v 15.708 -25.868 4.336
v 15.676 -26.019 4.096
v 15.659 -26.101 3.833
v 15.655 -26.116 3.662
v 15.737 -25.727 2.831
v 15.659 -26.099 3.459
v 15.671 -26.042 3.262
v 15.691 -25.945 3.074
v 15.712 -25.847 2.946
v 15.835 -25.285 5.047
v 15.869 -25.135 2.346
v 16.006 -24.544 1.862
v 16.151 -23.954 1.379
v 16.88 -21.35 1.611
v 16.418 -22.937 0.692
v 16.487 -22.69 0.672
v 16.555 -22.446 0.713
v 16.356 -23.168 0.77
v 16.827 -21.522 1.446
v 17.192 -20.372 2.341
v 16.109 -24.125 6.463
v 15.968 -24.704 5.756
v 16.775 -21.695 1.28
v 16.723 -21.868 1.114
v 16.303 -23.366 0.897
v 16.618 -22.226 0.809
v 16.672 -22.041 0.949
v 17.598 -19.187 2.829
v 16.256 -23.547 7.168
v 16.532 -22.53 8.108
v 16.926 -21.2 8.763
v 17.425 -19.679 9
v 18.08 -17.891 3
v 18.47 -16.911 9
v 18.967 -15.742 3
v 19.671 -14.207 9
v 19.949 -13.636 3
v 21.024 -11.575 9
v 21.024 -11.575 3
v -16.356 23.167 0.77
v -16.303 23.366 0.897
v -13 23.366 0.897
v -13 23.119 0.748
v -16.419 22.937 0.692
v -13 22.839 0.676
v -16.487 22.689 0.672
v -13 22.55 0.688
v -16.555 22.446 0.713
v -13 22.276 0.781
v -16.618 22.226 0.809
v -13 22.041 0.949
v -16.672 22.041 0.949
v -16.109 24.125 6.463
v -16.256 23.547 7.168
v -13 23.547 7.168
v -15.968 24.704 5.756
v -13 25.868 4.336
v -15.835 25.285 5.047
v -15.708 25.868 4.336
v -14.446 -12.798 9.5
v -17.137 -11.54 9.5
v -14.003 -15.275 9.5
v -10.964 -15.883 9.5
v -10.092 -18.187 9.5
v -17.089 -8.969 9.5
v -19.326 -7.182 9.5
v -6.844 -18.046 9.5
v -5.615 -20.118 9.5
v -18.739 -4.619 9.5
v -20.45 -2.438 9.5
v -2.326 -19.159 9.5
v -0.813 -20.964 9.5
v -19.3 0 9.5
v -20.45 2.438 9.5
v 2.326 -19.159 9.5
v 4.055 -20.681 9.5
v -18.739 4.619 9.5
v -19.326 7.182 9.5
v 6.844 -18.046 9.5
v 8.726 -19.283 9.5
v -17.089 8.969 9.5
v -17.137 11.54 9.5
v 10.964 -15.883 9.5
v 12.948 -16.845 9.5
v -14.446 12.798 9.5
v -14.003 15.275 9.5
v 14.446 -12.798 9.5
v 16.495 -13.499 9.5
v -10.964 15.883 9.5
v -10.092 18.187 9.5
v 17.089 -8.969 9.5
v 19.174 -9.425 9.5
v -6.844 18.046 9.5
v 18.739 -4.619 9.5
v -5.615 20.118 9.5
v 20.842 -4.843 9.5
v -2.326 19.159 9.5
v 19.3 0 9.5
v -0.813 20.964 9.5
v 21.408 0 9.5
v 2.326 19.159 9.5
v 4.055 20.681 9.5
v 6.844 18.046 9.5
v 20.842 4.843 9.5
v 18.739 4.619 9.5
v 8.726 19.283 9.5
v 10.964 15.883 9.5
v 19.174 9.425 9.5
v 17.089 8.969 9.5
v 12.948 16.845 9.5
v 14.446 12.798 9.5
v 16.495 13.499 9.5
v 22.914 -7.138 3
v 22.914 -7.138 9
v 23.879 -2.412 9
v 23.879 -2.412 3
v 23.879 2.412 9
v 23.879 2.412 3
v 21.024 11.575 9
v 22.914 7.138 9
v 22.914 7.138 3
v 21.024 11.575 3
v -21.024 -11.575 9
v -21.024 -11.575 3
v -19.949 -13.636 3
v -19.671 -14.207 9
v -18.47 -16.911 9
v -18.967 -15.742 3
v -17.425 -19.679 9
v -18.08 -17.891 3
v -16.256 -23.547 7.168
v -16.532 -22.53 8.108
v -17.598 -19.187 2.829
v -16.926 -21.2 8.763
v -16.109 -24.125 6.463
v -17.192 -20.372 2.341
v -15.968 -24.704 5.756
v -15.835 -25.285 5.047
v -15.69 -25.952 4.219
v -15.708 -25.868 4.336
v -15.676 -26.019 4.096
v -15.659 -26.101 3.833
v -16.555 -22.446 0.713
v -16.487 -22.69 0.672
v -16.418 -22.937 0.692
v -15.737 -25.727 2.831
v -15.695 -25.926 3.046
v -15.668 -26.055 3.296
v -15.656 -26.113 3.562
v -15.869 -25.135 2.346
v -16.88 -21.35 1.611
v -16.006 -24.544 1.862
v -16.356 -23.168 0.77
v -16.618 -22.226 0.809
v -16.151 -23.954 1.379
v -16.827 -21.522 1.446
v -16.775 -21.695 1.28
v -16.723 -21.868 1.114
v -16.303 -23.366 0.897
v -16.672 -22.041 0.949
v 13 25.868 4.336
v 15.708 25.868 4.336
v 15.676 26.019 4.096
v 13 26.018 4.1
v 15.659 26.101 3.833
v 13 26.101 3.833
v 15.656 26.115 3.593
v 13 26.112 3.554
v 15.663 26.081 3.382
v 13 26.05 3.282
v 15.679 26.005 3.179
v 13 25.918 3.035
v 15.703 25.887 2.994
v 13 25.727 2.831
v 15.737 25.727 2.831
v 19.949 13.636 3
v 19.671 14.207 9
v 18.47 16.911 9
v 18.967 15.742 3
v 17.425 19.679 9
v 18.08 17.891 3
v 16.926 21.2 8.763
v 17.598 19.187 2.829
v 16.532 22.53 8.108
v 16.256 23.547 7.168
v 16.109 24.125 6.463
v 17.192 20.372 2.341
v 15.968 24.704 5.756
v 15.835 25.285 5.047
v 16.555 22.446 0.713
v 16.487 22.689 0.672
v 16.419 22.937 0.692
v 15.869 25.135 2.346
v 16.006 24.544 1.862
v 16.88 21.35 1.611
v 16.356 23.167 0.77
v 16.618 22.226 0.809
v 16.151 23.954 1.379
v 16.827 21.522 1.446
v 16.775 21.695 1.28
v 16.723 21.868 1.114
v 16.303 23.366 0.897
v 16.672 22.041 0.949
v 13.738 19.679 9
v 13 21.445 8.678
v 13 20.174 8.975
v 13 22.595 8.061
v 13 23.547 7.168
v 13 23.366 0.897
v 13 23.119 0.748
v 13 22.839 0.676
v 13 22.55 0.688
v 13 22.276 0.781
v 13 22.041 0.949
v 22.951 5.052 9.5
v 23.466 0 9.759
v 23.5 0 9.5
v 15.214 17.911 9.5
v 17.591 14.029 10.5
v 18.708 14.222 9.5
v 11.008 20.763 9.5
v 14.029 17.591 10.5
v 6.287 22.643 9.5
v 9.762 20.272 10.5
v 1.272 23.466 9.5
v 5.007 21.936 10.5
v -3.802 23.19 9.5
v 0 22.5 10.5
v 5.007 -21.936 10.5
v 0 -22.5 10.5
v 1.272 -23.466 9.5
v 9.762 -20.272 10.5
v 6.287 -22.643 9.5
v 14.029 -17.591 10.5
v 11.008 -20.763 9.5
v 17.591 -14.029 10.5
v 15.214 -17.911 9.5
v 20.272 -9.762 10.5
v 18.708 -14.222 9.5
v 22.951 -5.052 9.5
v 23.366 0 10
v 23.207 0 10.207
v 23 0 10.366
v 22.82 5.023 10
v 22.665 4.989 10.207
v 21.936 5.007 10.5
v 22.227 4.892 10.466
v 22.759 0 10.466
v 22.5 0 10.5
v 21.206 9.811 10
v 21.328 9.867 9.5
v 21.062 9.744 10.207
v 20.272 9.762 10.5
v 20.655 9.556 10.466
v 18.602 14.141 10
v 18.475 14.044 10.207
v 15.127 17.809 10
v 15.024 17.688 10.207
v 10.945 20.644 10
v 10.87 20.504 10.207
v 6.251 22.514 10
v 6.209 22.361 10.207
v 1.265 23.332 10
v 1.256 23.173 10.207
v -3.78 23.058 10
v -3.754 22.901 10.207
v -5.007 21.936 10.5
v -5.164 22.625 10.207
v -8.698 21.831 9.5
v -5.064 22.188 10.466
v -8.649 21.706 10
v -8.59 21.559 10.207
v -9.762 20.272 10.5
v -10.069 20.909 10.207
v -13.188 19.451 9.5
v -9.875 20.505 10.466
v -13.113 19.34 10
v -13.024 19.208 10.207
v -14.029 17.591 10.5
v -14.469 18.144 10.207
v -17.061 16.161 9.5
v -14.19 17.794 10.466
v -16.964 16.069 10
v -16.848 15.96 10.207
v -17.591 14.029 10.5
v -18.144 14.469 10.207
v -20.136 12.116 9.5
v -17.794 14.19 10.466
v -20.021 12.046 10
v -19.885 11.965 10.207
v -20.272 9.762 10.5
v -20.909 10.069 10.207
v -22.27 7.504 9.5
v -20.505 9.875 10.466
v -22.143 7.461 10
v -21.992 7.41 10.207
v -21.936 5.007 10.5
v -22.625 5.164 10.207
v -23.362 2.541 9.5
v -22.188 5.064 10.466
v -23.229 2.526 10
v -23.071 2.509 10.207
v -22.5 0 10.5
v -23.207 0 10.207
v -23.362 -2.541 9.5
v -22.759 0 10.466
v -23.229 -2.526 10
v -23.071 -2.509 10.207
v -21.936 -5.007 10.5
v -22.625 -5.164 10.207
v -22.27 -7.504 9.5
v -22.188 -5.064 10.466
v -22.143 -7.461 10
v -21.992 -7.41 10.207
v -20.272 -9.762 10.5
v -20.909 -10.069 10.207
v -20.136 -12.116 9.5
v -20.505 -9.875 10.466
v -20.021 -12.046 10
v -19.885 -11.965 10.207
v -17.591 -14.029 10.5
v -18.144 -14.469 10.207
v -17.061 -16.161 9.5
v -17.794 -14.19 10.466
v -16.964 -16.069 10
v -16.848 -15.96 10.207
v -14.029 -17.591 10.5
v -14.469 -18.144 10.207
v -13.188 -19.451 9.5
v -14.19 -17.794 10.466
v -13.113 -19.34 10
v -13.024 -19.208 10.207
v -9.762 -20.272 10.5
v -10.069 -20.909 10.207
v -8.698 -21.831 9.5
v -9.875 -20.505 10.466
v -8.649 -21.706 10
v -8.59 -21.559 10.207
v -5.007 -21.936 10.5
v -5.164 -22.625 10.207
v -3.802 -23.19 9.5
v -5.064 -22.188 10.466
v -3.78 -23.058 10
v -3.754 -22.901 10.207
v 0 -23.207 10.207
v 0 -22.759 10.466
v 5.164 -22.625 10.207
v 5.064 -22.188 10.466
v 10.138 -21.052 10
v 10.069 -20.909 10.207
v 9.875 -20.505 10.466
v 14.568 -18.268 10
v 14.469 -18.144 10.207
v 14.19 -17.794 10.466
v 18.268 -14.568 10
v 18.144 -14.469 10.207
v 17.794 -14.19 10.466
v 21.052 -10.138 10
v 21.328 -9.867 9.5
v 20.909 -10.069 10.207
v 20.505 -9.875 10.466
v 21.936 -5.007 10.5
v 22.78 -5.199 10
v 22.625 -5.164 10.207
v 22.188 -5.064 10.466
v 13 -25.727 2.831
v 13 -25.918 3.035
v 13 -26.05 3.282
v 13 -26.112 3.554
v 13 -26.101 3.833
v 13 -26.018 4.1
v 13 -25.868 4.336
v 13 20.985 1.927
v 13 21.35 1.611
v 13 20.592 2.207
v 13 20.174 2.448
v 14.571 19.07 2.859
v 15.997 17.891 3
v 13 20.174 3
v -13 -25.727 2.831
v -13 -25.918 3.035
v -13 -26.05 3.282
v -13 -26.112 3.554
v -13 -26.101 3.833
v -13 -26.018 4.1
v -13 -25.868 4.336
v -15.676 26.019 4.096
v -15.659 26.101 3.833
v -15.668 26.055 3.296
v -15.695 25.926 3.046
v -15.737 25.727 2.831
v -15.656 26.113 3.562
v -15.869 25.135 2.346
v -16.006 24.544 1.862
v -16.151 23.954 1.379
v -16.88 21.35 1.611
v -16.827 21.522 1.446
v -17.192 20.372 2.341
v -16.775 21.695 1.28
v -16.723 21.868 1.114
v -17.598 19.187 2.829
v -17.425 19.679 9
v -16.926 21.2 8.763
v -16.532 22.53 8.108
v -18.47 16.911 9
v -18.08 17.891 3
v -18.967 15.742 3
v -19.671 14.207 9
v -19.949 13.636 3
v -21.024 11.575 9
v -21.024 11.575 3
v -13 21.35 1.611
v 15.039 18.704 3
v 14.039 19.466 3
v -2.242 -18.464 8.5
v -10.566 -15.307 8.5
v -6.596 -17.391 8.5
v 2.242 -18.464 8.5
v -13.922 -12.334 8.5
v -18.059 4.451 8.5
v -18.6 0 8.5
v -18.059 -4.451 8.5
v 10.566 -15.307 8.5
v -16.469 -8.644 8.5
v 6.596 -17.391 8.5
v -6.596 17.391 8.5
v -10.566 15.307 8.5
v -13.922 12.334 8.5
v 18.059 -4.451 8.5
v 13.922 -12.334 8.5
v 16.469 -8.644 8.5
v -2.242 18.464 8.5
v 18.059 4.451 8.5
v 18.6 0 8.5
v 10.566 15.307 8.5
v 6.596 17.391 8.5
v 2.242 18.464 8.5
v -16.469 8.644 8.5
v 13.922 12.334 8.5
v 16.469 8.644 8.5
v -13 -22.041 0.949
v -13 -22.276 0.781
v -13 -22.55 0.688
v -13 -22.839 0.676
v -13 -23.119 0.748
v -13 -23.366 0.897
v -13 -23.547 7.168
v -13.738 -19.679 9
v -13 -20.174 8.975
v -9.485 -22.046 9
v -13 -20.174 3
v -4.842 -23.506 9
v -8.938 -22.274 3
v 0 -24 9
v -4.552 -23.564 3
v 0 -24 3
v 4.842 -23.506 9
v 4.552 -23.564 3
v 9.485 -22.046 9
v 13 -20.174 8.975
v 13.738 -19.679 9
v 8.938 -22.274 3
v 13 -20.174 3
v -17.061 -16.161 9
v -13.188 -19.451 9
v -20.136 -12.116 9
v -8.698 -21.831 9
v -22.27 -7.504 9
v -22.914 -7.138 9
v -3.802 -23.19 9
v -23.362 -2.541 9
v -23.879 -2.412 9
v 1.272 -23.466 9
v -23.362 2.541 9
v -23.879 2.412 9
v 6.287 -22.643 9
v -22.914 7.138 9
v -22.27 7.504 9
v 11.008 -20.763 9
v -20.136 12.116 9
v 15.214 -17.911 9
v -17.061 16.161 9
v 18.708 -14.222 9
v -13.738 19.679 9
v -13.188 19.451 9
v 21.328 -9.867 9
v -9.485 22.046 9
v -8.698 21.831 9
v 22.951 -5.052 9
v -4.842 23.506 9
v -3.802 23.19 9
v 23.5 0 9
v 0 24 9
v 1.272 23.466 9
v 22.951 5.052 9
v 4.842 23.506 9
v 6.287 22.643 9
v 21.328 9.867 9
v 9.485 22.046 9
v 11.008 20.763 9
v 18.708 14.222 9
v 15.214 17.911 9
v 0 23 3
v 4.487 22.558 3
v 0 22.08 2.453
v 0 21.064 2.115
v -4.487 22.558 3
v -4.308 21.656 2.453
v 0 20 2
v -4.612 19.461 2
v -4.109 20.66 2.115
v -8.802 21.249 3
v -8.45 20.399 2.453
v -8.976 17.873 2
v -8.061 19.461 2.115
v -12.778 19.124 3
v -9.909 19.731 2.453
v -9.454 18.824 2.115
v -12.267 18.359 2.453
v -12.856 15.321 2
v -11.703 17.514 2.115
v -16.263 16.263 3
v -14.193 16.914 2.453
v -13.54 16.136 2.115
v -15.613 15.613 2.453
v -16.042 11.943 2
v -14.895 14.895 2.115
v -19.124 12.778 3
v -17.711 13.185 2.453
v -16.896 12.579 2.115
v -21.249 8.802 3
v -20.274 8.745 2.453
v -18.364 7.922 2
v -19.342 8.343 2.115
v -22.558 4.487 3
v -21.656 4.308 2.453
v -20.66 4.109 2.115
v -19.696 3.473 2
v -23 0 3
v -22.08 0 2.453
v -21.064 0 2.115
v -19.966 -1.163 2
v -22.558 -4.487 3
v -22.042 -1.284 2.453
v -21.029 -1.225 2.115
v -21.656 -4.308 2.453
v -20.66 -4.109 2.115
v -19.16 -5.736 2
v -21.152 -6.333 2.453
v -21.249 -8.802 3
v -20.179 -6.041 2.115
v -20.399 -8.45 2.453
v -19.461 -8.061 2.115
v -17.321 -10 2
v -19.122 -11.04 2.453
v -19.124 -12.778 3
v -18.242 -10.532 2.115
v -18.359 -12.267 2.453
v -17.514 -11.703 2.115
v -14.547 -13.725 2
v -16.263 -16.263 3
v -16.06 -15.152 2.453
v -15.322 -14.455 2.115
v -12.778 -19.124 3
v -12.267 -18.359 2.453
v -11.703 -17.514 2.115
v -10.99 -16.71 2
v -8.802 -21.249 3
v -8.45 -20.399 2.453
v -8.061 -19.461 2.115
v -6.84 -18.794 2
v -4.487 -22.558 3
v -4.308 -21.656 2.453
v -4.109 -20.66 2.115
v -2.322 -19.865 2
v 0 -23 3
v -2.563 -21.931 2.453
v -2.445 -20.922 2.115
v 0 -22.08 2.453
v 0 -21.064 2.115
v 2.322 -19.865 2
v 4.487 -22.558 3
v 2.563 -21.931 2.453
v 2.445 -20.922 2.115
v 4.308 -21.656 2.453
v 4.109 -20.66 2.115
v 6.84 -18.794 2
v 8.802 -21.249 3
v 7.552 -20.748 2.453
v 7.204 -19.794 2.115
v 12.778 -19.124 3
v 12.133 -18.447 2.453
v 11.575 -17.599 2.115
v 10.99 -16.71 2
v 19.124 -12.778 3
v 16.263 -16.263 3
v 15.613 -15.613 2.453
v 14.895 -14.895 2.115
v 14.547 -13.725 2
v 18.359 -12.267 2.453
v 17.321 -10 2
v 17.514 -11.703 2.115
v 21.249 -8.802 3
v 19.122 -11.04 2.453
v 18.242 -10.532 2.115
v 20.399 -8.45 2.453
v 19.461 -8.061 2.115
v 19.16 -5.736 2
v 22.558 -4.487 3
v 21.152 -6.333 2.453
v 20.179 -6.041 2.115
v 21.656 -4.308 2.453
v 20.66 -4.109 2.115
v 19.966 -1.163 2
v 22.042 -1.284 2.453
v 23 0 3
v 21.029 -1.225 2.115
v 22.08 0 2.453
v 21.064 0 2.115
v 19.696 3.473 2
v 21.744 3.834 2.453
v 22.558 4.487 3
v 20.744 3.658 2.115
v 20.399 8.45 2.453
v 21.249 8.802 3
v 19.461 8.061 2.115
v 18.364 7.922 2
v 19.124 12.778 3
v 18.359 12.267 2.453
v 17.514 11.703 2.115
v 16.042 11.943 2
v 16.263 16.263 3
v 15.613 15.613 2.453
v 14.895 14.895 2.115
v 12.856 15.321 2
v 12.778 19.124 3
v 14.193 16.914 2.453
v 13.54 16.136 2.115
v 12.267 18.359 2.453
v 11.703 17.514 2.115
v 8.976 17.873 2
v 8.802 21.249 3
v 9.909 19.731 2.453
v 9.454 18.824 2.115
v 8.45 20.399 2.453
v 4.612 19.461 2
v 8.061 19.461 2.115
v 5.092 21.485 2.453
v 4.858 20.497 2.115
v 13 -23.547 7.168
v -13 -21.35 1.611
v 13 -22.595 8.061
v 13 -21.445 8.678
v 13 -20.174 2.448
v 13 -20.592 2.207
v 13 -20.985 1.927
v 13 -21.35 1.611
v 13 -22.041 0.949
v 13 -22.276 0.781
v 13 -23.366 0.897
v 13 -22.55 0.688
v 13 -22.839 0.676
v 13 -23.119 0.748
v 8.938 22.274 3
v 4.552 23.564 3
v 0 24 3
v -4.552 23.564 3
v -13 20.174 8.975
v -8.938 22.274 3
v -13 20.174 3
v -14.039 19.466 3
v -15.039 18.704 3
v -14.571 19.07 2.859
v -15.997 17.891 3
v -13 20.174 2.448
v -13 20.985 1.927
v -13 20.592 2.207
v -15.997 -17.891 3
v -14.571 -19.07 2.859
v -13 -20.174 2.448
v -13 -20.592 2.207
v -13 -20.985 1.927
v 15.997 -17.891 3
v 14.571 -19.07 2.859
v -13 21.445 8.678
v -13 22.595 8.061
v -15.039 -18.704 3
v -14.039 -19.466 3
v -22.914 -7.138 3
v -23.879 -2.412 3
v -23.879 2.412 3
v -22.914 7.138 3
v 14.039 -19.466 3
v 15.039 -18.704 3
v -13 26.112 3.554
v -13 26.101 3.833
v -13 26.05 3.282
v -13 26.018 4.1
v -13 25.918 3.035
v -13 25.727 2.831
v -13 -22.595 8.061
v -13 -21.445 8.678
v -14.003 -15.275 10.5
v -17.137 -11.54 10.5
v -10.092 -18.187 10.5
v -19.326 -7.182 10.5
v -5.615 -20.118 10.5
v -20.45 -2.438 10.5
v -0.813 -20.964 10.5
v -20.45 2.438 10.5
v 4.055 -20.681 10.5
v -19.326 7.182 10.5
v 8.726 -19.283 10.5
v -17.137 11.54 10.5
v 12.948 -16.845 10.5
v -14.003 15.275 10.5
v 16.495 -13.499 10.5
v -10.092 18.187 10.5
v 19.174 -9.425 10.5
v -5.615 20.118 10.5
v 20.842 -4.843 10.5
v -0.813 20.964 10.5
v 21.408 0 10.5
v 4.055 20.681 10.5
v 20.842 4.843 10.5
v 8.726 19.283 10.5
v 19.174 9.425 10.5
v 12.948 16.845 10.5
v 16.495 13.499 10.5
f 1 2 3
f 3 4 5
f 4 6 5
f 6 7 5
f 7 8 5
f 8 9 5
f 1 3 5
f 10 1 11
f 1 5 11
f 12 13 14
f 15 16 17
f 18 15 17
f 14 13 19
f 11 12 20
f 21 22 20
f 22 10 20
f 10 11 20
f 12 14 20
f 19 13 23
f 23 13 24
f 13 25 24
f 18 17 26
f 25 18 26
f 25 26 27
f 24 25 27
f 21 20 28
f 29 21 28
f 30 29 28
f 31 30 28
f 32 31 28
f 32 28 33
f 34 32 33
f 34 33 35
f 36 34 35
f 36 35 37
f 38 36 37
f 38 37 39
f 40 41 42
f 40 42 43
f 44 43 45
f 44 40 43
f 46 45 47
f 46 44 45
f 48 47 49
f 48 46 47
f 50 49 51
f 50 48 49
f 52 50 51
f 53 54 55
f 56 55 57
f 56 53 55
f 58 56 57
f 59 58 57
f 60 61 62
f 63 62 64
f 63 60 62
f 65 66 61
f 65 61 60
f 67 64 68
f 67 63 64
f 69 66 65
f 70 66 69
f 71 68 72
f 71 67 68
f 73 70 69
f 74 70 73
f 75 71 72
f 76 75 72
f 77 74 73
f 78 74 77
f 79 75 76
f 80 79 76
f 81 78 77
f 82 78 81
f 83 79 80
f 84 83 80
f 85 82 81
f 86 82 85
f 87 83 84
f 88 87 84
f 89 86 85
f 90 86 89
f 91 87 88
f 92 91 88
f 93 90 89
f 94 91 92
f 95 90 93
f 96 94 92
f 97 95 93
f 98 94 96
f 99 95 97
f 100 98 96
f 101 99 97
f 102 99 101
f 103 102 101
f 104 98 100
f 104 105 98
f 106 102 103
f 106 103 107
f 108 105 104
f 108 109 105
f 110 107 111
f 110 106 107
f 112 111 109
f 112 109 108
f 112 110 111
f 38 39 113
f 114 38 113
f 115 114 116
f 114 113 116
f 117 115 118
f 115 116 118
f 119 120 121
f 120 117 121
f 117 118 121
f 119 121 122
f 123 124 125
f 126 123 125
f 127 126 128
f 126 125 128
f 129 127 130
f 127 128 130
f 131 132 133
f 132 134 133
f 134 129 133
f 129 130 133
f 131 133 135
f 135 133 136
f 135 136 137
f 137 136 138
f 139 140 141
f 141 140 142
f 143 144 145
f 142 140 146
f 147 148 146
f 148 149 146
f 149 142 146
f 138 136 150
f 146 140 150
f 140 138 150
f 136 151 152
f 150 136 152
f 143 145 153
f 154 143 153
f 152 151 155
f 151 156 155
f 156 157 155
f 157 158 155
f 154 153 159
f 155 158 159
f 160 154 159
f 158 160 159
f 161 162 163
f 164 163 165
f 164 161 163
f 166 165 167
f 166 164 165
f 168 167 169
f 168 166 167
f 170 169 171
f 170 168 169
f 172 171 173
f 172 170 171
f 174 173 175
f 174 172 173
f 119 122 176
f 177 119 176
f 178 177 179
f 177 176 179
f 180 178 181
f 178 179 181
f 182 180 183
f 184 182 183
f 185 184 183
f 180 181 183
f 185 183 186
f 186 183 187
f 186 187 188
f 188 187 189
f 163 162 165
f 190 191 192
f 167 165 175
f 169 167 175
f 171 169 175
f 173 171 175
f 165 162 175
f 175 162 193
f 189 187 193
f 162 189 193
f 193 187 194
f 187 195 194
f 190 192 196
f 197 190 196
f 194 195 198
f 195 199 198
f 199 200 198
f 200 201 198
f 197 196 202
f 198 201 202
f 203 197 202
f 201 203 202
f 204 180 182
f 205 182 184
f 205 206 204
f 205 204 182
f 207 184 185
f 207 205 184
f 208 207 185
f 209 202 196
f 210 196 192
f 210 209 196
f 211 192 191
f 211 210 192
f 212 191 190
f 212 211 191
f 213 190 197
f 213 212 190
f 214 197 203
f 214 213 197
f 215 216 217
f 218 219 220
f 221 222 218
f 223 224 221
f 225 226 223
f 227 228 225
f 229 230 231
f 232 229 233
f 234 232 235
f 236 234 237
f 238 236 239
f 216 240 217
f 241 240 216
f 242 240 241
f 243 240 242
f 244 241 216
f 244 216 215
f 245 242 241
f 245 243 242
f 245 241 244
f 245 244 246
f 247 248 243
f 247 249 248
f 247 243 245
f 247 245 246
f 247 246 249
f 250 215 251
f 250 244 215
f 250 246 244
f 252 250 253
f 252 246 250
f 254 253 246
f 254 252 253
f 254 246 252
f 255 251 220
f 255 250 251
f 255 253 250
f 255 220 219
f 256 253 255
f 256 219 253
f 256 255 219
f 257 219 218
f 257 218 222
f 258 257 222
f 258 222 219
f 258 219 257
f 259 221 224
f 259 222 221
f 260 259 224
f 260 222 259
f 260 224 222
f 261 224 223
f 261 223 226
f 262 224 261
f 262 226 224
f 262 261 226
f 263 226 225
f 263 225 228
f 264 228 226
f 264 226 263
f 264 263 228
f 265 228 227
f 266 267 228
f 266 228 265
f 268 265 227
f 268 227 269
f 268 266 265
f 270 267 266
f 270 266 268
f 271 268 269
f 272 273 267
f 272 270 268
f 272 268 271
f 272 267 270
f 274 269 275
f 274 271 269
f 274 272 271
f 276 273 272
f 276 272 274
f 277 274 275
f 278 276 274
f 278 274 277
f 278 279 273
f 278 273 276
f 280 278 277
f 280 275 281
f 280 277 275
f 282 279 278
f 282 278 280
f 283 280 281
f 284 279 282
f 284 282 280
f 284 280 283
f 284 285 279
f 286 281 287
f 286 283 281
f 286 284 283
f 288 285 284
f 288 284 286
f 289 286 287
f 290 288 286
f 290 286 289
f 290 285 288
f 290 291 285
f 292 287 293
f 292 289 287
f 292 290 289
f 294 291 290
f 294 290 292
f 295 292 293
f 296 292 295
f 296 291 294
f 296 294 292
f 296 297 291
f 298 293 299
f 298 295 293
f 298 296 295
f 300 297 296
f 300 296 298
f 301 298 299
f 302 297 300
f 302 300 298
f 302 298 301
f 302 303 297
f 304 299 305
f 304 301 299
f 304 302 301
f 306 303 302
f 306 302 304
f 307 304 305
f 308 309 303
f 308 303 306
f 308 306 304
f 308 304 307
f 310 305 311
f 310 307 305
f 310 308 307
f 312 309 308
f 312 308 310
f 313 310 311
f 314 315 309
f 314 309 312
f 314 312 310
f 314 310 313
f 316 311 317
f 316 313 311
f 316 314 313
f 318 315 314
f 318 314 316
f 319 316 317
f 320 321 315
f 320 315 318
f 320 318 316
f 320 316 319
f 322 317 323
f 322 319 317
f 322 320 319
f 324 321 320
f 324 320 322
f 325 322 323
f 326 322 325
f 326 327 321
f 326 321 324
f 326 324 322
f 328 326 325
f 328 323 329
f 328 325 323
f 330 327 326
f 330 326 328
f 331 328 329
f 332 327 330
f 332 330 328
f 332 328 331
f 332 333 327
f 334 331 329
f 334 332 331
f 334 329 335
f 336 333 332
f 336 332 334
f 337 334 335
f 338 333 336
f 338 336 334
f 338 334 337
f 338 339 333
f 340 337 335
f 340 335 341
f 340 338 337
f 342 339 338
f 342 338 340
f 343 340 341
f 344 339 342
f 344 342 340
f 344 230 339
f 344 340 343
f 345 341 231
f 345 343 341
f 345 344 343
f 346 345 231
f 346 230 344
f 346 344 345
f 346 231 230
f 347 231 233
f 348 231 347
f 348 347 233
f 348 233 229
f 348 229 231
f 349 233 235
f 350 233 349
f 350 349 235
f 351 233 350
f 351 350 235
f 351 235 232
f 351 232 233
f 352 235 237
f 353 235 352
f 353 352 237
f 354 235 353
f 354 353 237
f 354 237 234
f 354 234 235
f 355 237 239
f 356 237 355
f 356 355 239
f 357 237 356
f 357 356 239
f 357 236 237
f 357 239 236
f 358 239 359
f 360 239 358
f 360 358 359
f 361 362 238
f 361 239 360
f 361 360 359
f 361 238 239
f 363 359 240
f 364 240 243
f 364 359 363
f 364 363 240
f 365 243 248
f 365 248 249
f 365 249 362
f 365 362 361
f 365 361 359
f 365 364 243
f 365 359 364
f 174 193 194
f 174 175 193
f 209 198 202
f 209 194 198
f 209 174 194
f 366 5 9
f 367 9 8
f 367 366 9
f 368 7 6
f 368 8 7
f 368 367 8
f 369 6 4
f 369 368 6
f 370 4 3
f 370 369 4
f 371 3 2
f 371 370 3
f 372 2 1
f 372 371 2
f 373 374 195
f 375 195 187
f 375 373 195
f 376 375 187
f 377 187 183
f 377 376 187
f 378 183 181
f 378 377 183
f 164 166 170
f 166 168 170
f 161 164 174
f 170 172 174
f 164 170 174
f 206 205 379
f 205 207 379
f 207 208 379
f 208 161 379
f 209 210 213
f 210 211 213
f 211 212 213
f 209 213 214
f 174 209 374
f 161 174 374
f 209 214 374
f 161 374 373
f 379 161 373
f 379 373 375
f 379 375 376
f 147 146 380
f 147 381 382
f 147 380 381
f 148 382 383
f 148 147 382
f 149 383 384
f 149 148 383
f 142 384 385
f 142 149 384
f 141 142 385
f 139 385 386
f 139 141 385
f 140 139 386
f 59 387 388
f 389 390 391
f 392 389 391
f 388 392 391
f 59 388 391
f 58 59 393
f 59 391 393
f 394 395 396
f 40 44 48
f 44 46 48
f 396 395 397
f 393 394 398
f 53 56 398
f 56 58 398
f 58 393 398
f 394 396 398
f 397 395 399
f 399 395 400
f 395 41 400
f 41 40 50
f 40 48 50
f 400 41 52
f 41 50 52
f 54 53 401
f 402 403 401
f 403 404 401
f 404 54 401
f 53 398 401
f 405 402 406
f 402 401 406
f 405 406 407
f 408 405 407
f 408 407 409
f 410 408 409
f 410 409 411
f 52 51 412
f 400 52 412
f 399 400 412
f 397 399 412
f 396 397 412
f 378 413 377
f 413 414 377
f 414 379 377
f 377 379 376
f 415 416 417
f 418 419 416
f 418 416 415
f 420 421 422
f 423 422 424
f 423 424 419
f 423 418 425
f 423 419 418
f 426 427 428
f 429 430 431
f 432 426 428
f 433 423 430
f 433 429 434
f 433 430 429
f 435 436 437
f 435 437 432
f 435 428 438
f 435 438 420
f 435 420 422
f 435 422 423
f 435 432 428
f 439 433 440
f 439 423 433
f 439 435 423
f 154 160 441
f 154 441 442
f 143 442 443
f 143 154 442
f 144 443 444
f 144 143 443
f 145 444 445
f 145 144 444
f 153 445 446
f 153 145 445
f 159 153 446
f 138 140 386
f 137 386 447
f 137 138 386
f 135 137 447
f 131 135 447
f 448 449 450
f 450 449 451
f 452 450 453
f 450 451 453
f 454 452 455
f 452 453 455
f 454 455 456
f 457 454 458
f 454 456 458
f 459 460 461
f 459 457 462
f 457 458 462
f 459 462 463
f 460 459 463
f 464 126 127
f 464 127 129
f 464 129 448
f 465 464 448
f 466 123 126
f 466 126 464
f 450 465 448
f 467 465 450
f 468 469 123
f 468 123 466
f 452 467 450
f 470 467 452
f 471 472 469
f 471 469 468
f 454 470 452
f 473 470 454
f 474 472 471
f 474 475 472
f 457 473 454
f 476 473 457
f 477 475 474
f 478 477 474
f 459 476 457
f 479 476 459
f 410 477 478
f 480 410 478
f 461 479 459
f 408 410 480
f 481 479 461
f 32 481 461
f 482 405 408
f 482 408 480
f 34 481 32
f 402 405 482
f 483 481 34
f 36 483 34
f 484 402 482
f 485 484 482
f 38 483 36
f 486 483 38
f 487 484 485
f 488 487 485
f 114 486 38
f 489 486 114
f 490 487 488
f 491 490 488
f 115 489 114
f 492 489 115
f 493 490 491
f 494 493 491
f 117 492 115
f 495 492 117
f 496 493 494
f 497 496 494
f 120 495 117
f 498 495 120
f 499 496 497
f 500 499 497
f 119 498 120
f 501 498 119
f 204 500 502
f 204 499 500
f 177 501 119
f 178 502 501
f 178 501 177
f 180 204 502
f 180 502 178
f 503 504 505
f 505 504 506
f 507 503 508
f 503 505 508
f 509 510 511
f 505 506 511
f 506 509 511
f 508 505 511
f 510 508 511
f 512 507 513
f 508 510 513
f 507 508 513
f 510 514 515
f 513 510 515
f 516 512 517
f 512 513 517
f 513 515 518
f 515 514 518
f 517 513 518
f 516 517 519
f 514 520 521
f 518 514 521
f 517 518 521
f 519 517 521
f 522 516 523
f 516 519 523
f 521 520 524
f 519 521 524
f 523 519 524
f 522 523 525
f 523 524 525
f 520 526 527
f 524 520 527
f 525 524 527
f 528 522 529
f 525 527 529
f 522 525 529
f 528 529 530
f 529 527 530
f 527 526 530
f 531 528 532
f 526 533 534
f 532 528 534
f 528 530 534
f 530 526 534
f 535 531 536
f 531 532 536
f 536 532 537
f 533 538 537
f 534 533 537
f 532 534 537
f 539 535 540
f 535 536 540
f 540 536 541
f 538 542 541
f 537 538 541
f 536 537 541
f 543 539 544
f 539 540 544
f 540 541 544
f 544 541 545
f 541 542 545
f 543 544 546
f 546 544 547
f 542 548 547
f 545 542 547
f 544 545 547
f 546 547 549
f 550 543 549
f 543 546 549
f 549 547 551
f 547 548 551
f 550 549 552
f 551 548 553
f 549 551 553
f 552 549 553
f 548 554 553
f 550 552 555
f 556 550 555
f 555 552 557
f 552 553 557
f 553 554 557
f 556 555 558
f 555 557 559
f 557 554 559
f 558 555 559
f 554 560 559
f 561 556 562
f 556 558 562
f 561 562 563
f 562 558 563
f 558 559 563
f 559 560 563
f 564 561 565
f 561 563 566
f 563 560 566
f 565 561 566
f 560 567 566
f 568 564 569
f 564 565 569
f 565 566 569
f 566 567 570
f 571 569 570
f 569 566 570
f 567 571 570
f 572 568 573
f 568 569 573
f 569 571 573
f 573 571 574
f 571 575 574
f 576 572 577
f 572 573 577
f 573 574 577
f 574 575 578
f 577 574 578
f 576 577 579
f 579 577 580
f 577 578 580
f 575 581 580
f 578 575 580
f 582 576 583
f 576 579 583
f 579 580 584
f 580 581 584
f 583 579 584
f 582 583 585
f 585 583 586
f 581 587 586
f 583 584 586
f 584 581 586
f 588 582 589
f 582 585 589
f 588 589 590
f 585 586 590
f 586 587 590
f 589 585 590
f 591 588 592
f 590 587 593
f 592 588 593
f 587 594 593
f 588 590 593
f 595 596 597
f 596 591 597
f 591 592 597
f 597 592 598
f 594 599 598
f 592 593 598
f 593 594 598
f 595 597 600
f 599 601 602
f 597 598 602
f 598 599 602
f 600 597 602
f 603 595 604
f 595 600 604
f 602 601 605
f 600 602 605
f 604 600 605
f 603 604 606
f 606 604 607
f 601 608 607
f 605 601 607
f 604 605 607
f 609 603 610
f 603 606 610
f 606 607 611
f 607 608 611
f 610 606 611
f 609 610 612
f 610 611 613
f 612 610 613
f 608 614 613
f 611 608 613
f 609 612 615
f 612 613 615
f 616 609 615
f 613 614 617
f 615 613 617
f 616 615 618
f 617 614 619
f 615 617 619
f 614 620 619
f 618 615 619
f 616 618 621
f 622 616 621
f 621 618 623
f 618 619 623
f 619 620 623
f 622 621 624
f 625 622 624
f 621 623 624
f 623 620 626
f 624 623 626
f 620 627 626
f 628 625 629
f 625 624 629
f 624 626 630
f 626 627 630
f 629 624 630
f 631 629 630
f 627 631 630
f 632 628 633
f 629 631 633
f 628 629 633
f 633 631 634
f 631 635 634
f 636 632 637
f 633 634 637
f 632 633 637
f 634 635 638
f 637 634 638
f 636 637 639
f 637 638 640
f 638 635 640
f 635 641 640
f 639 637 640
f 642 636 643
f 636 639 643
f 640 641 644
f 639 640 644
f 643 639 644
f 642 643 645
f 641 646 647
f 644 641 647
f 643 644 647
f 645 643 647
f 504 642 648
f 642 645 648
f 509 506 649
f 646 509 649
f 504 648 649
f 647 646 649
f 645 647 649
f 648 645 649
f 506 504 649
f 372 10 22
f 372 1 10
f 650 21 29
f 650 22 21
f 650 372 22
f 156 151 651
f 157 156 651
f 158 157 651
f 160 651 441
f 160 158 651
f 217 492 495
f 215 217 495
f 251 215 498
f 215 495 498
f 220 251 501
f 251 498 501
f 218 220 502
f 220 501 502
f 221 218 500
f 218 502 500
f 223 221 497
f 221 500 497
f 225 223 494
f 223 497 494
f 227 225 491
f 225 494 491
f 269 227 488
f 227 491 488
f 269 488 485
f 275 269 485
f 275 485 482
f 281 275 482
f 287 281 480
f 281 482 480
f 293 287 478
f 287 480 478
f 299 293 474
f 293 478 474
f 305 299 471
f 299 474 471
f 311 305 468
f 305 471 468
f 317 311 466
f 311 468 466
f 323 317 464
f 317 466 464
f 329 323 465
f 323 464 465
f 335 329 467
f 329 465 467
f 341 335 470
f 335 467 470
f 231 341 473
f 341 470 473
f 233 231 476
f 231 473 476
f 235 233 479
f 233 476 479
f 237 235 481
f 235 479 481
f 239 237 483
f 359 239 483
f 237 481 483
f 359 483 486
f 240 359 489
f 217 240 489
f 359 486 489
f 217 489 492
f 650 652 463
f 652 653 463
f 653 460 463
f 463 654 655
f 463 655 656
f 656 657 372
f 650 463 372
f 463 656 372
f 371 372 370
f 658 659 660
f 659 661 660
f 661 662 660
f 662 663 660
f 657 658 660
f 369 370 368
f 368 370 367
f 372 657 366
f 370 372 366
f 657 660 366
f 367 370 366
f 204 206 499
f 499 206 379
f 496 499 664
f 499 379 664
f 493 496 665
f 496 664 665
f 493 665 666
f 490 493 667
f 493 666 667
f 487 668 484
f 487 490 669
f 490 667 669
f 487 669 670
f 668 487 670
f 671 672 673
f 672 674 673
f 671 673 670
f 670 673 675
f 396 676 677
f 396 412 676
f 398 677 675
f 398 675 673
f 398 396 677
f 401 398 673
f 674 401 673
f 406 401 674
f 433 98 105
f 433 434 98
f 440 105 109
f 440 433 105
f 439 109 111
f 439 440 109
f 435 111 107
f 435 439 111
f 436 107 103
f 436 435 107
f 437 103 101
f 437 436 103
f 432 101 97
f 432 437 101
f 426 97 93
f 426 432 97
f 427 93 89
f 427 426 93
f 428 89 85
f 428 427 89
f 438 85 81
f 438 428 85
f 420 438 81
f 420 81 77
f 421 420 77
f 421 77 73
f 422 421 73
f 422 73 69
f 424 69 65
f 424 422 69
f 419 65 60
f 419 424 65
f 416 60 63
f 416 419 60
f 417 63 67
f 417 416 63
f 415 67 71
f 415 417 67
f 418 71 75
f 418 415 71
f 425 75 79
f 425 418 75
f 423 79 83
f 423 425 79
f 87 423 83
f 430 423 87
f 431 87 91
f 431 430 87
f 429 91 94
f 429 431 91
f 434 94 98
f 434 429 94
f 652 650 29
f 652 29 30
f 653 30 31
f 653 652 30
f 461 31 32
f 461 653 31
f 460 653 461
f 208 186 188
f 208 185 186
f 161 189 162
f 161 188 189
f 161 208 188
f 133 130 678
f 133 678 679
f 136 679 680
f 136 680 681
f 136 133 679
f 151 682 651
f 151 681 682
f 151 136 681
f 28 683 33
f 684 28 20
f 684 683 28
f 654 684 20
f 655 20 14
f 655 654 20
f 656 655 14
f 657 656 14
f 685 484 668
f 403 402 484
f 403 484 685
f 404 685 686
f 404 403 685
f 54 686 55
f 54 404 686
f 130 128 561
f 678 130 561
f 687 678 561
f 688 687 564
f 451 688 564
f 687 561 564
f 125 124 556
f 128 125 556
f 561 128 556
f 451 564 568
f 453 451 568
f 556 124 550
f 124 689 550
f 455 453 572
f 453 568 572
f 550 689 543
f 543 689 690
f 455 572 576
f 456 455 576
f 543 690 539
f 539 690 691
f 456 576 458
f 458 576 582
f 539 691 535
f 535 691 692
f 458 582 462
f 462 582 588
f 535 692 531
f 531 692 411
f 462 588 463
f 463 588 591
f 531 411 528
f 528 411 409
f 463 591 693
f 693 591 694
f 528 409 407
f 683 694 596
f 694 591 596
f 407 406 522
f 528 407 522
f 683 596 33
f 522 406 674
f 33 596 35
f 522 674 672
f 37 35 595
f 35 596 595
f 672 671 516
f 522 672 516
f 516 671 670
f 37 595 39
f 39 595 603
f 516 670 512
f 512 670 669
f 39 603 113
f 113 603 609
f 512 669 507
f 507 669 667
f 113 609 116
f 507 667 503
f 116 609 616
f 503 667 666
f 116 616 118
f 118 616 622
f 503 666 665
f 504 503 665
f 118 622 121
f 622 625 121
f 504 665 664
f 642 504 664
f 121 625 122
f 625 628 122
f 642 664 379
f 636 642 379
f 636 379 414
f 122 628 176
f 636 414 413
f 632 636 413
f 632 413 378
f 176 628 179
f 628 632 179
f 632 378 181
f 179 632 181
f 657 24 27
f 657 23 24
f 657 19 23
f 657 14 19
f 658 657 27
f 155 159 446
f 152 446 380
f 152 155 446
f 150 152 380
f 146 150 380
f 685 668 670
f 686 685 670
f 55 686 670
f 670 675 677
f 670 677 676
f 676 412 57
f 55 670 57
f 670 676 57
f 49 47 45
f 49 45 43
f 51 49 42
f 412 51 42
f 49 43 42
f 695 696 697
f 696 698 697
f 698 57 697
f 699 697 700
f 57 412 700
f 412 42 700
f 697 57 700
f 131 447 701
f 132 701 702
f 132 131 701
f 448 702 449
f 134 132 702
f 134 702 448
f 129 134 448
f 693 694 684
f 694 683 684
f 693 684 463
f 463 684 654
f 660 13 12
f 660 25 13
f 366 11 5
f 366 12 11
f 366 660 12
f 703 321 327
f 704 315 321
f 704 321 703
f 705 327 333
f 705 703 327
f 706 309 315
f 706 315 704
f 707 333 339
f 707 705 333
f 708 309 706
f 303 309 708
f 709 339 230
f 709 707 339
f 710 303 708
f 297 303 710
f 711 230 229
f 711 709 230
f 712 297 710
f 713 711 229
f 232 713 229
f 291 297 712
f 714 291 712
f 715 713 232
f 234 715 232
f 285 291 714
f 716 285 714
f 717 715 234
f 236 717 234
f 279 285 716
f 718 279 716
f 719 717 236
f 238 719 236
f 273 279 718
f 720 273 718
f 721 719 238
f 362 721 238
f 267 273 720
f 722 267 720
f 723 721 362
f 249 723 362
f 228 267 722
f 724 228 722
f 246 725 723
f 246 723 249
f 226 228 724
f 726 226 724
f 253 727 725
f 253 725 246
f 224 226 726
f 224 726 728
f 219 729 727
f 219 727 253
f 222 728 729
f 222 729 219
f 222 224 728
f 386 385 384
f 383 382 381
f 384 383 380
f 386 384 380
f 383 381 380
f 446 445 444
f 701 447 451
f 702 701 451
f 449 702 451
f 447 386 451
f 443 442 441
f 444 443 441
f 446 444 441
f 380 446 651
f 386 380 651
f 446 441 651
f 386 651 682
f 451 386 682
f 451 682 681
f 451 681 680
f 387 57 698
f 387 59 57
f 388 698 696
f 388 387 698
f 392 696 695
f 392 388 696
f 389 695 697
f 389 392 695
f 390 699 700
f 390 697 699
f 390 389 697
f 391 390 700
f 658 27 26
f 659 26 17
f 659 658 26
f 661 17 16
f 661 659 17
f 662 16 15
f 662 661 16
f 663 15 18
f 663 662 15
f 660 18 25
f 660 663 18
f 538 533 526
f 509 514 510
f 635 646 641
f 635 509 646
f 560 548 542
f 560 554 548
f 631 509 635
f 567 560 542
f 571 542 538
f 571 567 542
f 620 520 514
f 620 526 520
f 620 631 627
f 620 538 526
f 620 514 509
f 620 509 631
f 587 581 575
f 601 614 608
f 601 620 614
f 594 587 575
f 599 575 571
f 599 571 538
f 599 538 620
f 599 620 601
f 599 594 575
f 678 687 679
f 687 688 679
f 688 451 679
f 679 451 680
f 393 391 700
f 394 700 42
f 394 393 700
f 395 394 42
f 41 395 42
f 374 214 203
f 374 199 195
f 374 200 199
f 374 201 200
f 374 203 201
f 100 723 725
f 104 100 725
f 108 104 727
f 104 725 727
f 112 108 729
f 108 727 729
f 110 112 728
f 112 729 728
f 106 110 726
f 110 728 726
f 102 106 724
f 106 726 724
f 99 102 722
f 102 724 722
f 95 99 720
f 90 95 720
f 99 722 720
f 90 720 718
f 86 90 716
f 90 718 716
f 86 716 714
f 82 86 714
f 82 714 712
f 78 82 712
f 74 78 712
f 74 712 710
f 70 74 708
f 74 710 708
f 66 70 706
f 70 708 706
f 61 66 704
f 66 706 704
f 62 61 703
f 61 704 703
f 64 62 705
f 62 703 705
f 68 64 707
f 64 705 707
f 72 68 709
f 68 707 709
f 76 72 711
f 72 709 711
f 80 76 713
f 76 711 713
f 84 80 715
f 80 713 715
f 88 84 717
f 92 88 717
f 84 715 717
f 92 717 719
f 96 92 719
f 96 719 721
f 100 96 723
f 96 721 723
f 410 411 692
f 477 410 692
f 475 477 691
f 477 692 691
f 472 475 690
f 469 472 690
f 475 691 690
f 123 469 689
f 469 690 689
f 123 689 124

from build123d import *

# Parameters (mm, degrees)
F3_DEPTH      = 25
F6_DEPTH      = 25
F6_DEPTH_BACK = 25
F8_DEPTH      = 25
F8_DEPTH_BACK = 25
F10_R         = 24
F11_DEPTH     = 6
F13_DEPTH     = 1
F15_R         = 23.5
F16_DEPTH     = 1.5
F17_R         = 1
F18_R         = 20
F19_DEPTH     = 2
F19_TAPER     = 35
F20_R         = 21
F21_DEPTH     = 1


# Not quite as in the source:
# - a fillet or chamfer that OpenCascade refuses, or shapes differently, is made with other operations: its cross-section is extruded or revolved along the edge and cut away or added


with BuildPart() as f3:
    # F2 (on Top) → F3 (new body)
    with BuildSketch(Plane.XY):
        with BuildLine():
            Line((-13, 20.1742410018), (-13, 26.1742410018))
            Line((-13, 26.1742410018), (-15.6435015354, 26.1742410018))
            ThreePointArc((-15.6435015354, 26.1742410018), (-17.78469231, 18.672379989), (-21.0241029415, 11.5752795))
            ThreePointArc((-21.0241029415, 11.5752795), (-17.5469493067, 16.3738990478), (-13, 20.1742410018))
        make_face()
    extrude(amount=F3_DEPTH)


with BuildPart() as f3b:
    # F2 (on Top) → F3, piece 2 (new body)
    with BuildSketch(Plane.XY):
        with BuildLine():
            Line((13, 26.1742410018), (13, 20.1742410018))
            ThreePointArc((13, 20.1742410018), (17.5469493067, 16.3738990478), (21.0241029415, 11.5752795))
            ThreePointArc((21.0241029415, 11.5752795), (17.78469231, 18.672379989), (15.6435015354, 26.1742410018))
            Line((15.6435015354, 26.1742410018), (13, 26.1742410018))
        make_face()
    extrude(amount=F3_DEPTH)


with BuildPart() as f3c:
    # F2 (on Top) → F3, piece 3 (new body)
    with BuildSketch(Plane.XY):
        with BuildLine():
            ThreePointArc((-13, -20.1742410018), (-17.5469493067, -16.3738990478), (-21.0241029415, -11.5752795))
            ThreePointArc((-21.0241029415, -11.5752795), (-17.78469231, -18.672379989), (-15.6435015354, -26.1742410018))
            Line((-15.6435015354, -26.1742410018), (-13, -26.1742410018))
            Line((-13, -26.1742410018), (-13, -20.1742410018))
        make_face()
    extrude(amount=F3_DEPTH)


with BuildPart() as f3d:
    # F2 (on Top) → F3, piece 4 (new body)
    with BuildSketch(Plane.XY):
        with BuildLine():
            ThreePointArc((15.6435015354, -26.1742410018), (17.78469231, -18.672379989), (21.0241029415, -11.5752795))
            ThreePointArc((21.0241029415, -11.5752795), (17.5469493067, -16.3738990478), (13, -20.1742410018))
            Line((13, -20.1742410018), (13, -26.1742410018))
            Line((13, -26.1742410018), (15.6435015354, -26.1742410018))
        make_face()
    extrude(amount=F3_DEPTH)


with BuildPart() as f6_tool:
    # F5 (on Right) → F6 (new body, two sides)
    with BuildSketch(Plane.YZ) as f6_sk:
        with BuildLine():
            Line((23.5471649475, 7.1683851421), (27.7989016838, 1.9778330012))
            Line((27.7989016838, 1.9778330012), (27.7989016838, 26.740285454))
            Line((27.7989016838, 26.740285454), (-29.0615007661, 26.740285454))
            Line((-29.0615007661, 26.740285454), (-27.7989016838, 1.9778330012))
            Line((-27.7989016838, 1.9778330012), (-23.5471649475, 7.1683851421))
            ThreePointArc((-23.5471649475, 7.1683851421), (-21.8190448857, 8.5189558788), (-19.6791764535, 8.999999905))
            Line((-19.6791764535, 8.999999905), (0, 8.999999905))
            Line((0, 8.999999905), (19.6791764535, 8.999999905))
            ThreePointArc((19.6791764535, 8.999999905), (21.8190448857, 8.5189558788), (23.5471649475, 7.1683851421))
        make_face()
    extrude(amount=-F6_DEPTH)
    extrude(f6_sk.sketch, amount=F6_DEPTH_BACK)


with BuildPart() as f3_1:
    add(f3.part)

    # F6: cut by f6_tool
    add(f6_tool.part, mode=Mode.SUBTRACT)


with BuildPart() as f3b_1:
    add(f3b.part)

    # F6: cut by f6_tool
    add(f6_tool.part, mode=Mode.SUBTRACT)


with BuildPart() as f3c_1:
    add(f3c.part)

    # F6: cut by f6_tool
    add(f6_tool.part, mode=Mode.SUBTRACT)


with BuildPart() as f3d_1:
    add(f3d.part)

    # F6: cut by f6_tool
    add(f6_tool.part, mode=Mode.SUBTRACT)


with BuildPart() as f8_tool:
    # F7 (on Right) → F8 (new body, two sides)
    with BuildSketch(Plane.YZ) as f8_sk:
        with BuildLine():
            Line((17.8908835105, 3), (0, 3))
            Line((0, 3), (-17.8908835105, 3))
            ThreePointArc((-17.8908835105, 3), (-19.7544863974, 2.639718125), (-21.3495203475, 1.6107937119))
            Line((-21.3495203475, 1.6107937119), (-22.0408191574, 0.9486258563))
            ThreePointArc((-22.0408191574, 0.9486258563), (-22.6937657116, 0.6715368573), (-23.3662235722, 0.8971868999))
            Line((-23.3662235722, 0.8971868999), (-25.727452218, 2.8313400119))
            ThreePointArc((-25.727452218, 2.8313400119), (-26.1117766069, 3.5541907786), (-25.8675033398, 4.3355671527))
            Line((-25.8675033398, 4.3355671527), (-26.6892556101, 5.8121909387))
            Line((-26.6892556101, 5.8121909387), (-28.4930374473, 3.2282707538))
            Line((-28.4930374473, 3.2282707538), (-28.1138848513, -2.6890258305))
            Line((-28.1138848513, -2.6890258305), (27.818409726, -2.2570919245))
            Line((27.818409726, -2.2570919245), (26.8063536115, 3.2282707538))
            Line((26.8063536115, 3.2282707538), (26.1989608407, 4.4945557602))
            Line((26.1989608407, 4.4945557602), (25.8675033398, 4.3355671527))
            ThreePointArc((25.8675033398, 4.3355671527), (26.1117766069, 3.5541907786), (25.727452218, 2.8313400119))
            Line((25.727452218, 2.8313400119), (23.3662235722, 0.8971868999))
            ThreePointArc((23.3662235722, 0.8971868999), (22.6937657116, 0.6715368573), (22.0408191574, 0.9486258563))
            Line((22.0408191574, 0.9486258563), (21.3495203475, 1.6107937119))
            ThreePointArc((21.3495203475, 1.6107937119), (19.7544863974, 2.639718125), (17.8908835105, 3))
        make_face()
    extrude(amount=-F8_DEPTH)
    extrude(f8_sk.sketch, amount=F8_DEPTH_BACK)


with BuildPart() as f3_2:
    add(f3_1.part)

    # F8: cut by f8_tool
    add(f8_tool.part, mode=Mode.SUBTRACT)



with BuildPart() as f3b_2:
    add(f3b_1.part)

    # F8: cut by f8_tool
    add(f8_tool.part, mode=Mode.SUBTRACT)


with BuildPart() as f3c_2:
    add(f3c_1.part)

    # F8: cut by f8_tool
    add(f8_tool.part, mode=Mode.SUBTRACT)


with BuildPart() as f3d_2:
    add(f3d_1.part)

    # F8: cut by f8_tool
    add(f8_tool.part, mode=Mode.SUBTRACT)


with BuildPart() as f3_3:
    add(f3_2.part)

    add(f3b_2.part)  # F11 merges F3b

    add(f3c_2.part)  # F11 merges F3c

    add(f3d_2.part)  # F11 merges F3d
    # F10 (on plane+point) → F11 (join)
    with BuildSketch(Plane.XY.offset(3)):
        Circle(F10_R)
    extrude(amount=F11_DEPTH)

    # F12 (on face) → F13 (join)
    with BuildSketch(Plane(origin=(0, 0, 3), x_dir=(1, 0, 0), z_dir=(0, 0, -1))):
        with BuildLine():
            ThreePointArc((23, 0), (16.2634559673, 16.2634559673), (0, 23))
            ThreePointArc((0, 23), (-16.2634559673, 16.2634559673), (-23, 0))
            ThreePointArc((-23, 0), (-16.2634559673, -16.2634559673), (0, -23))
            ThreePointArc((0, -23), (16.2634559673, -16.2634559673), (23, 0))
        make_face()
    extrude(amount=F13_DEPTH)

    # F14: fillet of radius 5 on 1 edges, made by hand

    # F14_s1 → F14_t2 (revolve, cut)
    with BuildSketch(Plane.YZ):
        with BuildLine():
            ThreePointArc((23, 3), (21.5811388301, 2.2565835097), (20, 2))
            Line((20, 2), (23, 2))
            Line((23, 2), (23, 3))
        make_face()
    revolve(axis=Axis((0, 0, 2), (0, 0, 1)), mode=Mode.SUBTRACT)

    # F15 (on face) → F16 (join)
    with BuildSketch(Plane.XY.offset(8.999999905)):
        Circle(F15_R)
    extrude(amount=F16_DEPTH)

    # F17
    f17_edges = [f3_3.edges().sort_by_distance(p)[0] for p in [
        (-23.5, 0, 10.5),
    ]]
    fillet(f17_edges, radius=F17_R)

    # F18 (on face) → F19 (cut)
    with BuildSketch(Plane.XY.offset(10.499999905)):
        Circle(F18_R)
    extrude(amount=-F19_DEPTH, taper=F19_TAPER, mode=Mode.SUBTRACT)

    # F20 (on face) → F21 (cut)
    with BuildSketch(Plane.XY.offset(10.499999905)):
        with Locations((0.4080029248, 0)):
            Circle(F20_R)
    extrude(amount=-F21_DEPTH, mode=Mode.SUBTRACT)


solid = f3_3.part
